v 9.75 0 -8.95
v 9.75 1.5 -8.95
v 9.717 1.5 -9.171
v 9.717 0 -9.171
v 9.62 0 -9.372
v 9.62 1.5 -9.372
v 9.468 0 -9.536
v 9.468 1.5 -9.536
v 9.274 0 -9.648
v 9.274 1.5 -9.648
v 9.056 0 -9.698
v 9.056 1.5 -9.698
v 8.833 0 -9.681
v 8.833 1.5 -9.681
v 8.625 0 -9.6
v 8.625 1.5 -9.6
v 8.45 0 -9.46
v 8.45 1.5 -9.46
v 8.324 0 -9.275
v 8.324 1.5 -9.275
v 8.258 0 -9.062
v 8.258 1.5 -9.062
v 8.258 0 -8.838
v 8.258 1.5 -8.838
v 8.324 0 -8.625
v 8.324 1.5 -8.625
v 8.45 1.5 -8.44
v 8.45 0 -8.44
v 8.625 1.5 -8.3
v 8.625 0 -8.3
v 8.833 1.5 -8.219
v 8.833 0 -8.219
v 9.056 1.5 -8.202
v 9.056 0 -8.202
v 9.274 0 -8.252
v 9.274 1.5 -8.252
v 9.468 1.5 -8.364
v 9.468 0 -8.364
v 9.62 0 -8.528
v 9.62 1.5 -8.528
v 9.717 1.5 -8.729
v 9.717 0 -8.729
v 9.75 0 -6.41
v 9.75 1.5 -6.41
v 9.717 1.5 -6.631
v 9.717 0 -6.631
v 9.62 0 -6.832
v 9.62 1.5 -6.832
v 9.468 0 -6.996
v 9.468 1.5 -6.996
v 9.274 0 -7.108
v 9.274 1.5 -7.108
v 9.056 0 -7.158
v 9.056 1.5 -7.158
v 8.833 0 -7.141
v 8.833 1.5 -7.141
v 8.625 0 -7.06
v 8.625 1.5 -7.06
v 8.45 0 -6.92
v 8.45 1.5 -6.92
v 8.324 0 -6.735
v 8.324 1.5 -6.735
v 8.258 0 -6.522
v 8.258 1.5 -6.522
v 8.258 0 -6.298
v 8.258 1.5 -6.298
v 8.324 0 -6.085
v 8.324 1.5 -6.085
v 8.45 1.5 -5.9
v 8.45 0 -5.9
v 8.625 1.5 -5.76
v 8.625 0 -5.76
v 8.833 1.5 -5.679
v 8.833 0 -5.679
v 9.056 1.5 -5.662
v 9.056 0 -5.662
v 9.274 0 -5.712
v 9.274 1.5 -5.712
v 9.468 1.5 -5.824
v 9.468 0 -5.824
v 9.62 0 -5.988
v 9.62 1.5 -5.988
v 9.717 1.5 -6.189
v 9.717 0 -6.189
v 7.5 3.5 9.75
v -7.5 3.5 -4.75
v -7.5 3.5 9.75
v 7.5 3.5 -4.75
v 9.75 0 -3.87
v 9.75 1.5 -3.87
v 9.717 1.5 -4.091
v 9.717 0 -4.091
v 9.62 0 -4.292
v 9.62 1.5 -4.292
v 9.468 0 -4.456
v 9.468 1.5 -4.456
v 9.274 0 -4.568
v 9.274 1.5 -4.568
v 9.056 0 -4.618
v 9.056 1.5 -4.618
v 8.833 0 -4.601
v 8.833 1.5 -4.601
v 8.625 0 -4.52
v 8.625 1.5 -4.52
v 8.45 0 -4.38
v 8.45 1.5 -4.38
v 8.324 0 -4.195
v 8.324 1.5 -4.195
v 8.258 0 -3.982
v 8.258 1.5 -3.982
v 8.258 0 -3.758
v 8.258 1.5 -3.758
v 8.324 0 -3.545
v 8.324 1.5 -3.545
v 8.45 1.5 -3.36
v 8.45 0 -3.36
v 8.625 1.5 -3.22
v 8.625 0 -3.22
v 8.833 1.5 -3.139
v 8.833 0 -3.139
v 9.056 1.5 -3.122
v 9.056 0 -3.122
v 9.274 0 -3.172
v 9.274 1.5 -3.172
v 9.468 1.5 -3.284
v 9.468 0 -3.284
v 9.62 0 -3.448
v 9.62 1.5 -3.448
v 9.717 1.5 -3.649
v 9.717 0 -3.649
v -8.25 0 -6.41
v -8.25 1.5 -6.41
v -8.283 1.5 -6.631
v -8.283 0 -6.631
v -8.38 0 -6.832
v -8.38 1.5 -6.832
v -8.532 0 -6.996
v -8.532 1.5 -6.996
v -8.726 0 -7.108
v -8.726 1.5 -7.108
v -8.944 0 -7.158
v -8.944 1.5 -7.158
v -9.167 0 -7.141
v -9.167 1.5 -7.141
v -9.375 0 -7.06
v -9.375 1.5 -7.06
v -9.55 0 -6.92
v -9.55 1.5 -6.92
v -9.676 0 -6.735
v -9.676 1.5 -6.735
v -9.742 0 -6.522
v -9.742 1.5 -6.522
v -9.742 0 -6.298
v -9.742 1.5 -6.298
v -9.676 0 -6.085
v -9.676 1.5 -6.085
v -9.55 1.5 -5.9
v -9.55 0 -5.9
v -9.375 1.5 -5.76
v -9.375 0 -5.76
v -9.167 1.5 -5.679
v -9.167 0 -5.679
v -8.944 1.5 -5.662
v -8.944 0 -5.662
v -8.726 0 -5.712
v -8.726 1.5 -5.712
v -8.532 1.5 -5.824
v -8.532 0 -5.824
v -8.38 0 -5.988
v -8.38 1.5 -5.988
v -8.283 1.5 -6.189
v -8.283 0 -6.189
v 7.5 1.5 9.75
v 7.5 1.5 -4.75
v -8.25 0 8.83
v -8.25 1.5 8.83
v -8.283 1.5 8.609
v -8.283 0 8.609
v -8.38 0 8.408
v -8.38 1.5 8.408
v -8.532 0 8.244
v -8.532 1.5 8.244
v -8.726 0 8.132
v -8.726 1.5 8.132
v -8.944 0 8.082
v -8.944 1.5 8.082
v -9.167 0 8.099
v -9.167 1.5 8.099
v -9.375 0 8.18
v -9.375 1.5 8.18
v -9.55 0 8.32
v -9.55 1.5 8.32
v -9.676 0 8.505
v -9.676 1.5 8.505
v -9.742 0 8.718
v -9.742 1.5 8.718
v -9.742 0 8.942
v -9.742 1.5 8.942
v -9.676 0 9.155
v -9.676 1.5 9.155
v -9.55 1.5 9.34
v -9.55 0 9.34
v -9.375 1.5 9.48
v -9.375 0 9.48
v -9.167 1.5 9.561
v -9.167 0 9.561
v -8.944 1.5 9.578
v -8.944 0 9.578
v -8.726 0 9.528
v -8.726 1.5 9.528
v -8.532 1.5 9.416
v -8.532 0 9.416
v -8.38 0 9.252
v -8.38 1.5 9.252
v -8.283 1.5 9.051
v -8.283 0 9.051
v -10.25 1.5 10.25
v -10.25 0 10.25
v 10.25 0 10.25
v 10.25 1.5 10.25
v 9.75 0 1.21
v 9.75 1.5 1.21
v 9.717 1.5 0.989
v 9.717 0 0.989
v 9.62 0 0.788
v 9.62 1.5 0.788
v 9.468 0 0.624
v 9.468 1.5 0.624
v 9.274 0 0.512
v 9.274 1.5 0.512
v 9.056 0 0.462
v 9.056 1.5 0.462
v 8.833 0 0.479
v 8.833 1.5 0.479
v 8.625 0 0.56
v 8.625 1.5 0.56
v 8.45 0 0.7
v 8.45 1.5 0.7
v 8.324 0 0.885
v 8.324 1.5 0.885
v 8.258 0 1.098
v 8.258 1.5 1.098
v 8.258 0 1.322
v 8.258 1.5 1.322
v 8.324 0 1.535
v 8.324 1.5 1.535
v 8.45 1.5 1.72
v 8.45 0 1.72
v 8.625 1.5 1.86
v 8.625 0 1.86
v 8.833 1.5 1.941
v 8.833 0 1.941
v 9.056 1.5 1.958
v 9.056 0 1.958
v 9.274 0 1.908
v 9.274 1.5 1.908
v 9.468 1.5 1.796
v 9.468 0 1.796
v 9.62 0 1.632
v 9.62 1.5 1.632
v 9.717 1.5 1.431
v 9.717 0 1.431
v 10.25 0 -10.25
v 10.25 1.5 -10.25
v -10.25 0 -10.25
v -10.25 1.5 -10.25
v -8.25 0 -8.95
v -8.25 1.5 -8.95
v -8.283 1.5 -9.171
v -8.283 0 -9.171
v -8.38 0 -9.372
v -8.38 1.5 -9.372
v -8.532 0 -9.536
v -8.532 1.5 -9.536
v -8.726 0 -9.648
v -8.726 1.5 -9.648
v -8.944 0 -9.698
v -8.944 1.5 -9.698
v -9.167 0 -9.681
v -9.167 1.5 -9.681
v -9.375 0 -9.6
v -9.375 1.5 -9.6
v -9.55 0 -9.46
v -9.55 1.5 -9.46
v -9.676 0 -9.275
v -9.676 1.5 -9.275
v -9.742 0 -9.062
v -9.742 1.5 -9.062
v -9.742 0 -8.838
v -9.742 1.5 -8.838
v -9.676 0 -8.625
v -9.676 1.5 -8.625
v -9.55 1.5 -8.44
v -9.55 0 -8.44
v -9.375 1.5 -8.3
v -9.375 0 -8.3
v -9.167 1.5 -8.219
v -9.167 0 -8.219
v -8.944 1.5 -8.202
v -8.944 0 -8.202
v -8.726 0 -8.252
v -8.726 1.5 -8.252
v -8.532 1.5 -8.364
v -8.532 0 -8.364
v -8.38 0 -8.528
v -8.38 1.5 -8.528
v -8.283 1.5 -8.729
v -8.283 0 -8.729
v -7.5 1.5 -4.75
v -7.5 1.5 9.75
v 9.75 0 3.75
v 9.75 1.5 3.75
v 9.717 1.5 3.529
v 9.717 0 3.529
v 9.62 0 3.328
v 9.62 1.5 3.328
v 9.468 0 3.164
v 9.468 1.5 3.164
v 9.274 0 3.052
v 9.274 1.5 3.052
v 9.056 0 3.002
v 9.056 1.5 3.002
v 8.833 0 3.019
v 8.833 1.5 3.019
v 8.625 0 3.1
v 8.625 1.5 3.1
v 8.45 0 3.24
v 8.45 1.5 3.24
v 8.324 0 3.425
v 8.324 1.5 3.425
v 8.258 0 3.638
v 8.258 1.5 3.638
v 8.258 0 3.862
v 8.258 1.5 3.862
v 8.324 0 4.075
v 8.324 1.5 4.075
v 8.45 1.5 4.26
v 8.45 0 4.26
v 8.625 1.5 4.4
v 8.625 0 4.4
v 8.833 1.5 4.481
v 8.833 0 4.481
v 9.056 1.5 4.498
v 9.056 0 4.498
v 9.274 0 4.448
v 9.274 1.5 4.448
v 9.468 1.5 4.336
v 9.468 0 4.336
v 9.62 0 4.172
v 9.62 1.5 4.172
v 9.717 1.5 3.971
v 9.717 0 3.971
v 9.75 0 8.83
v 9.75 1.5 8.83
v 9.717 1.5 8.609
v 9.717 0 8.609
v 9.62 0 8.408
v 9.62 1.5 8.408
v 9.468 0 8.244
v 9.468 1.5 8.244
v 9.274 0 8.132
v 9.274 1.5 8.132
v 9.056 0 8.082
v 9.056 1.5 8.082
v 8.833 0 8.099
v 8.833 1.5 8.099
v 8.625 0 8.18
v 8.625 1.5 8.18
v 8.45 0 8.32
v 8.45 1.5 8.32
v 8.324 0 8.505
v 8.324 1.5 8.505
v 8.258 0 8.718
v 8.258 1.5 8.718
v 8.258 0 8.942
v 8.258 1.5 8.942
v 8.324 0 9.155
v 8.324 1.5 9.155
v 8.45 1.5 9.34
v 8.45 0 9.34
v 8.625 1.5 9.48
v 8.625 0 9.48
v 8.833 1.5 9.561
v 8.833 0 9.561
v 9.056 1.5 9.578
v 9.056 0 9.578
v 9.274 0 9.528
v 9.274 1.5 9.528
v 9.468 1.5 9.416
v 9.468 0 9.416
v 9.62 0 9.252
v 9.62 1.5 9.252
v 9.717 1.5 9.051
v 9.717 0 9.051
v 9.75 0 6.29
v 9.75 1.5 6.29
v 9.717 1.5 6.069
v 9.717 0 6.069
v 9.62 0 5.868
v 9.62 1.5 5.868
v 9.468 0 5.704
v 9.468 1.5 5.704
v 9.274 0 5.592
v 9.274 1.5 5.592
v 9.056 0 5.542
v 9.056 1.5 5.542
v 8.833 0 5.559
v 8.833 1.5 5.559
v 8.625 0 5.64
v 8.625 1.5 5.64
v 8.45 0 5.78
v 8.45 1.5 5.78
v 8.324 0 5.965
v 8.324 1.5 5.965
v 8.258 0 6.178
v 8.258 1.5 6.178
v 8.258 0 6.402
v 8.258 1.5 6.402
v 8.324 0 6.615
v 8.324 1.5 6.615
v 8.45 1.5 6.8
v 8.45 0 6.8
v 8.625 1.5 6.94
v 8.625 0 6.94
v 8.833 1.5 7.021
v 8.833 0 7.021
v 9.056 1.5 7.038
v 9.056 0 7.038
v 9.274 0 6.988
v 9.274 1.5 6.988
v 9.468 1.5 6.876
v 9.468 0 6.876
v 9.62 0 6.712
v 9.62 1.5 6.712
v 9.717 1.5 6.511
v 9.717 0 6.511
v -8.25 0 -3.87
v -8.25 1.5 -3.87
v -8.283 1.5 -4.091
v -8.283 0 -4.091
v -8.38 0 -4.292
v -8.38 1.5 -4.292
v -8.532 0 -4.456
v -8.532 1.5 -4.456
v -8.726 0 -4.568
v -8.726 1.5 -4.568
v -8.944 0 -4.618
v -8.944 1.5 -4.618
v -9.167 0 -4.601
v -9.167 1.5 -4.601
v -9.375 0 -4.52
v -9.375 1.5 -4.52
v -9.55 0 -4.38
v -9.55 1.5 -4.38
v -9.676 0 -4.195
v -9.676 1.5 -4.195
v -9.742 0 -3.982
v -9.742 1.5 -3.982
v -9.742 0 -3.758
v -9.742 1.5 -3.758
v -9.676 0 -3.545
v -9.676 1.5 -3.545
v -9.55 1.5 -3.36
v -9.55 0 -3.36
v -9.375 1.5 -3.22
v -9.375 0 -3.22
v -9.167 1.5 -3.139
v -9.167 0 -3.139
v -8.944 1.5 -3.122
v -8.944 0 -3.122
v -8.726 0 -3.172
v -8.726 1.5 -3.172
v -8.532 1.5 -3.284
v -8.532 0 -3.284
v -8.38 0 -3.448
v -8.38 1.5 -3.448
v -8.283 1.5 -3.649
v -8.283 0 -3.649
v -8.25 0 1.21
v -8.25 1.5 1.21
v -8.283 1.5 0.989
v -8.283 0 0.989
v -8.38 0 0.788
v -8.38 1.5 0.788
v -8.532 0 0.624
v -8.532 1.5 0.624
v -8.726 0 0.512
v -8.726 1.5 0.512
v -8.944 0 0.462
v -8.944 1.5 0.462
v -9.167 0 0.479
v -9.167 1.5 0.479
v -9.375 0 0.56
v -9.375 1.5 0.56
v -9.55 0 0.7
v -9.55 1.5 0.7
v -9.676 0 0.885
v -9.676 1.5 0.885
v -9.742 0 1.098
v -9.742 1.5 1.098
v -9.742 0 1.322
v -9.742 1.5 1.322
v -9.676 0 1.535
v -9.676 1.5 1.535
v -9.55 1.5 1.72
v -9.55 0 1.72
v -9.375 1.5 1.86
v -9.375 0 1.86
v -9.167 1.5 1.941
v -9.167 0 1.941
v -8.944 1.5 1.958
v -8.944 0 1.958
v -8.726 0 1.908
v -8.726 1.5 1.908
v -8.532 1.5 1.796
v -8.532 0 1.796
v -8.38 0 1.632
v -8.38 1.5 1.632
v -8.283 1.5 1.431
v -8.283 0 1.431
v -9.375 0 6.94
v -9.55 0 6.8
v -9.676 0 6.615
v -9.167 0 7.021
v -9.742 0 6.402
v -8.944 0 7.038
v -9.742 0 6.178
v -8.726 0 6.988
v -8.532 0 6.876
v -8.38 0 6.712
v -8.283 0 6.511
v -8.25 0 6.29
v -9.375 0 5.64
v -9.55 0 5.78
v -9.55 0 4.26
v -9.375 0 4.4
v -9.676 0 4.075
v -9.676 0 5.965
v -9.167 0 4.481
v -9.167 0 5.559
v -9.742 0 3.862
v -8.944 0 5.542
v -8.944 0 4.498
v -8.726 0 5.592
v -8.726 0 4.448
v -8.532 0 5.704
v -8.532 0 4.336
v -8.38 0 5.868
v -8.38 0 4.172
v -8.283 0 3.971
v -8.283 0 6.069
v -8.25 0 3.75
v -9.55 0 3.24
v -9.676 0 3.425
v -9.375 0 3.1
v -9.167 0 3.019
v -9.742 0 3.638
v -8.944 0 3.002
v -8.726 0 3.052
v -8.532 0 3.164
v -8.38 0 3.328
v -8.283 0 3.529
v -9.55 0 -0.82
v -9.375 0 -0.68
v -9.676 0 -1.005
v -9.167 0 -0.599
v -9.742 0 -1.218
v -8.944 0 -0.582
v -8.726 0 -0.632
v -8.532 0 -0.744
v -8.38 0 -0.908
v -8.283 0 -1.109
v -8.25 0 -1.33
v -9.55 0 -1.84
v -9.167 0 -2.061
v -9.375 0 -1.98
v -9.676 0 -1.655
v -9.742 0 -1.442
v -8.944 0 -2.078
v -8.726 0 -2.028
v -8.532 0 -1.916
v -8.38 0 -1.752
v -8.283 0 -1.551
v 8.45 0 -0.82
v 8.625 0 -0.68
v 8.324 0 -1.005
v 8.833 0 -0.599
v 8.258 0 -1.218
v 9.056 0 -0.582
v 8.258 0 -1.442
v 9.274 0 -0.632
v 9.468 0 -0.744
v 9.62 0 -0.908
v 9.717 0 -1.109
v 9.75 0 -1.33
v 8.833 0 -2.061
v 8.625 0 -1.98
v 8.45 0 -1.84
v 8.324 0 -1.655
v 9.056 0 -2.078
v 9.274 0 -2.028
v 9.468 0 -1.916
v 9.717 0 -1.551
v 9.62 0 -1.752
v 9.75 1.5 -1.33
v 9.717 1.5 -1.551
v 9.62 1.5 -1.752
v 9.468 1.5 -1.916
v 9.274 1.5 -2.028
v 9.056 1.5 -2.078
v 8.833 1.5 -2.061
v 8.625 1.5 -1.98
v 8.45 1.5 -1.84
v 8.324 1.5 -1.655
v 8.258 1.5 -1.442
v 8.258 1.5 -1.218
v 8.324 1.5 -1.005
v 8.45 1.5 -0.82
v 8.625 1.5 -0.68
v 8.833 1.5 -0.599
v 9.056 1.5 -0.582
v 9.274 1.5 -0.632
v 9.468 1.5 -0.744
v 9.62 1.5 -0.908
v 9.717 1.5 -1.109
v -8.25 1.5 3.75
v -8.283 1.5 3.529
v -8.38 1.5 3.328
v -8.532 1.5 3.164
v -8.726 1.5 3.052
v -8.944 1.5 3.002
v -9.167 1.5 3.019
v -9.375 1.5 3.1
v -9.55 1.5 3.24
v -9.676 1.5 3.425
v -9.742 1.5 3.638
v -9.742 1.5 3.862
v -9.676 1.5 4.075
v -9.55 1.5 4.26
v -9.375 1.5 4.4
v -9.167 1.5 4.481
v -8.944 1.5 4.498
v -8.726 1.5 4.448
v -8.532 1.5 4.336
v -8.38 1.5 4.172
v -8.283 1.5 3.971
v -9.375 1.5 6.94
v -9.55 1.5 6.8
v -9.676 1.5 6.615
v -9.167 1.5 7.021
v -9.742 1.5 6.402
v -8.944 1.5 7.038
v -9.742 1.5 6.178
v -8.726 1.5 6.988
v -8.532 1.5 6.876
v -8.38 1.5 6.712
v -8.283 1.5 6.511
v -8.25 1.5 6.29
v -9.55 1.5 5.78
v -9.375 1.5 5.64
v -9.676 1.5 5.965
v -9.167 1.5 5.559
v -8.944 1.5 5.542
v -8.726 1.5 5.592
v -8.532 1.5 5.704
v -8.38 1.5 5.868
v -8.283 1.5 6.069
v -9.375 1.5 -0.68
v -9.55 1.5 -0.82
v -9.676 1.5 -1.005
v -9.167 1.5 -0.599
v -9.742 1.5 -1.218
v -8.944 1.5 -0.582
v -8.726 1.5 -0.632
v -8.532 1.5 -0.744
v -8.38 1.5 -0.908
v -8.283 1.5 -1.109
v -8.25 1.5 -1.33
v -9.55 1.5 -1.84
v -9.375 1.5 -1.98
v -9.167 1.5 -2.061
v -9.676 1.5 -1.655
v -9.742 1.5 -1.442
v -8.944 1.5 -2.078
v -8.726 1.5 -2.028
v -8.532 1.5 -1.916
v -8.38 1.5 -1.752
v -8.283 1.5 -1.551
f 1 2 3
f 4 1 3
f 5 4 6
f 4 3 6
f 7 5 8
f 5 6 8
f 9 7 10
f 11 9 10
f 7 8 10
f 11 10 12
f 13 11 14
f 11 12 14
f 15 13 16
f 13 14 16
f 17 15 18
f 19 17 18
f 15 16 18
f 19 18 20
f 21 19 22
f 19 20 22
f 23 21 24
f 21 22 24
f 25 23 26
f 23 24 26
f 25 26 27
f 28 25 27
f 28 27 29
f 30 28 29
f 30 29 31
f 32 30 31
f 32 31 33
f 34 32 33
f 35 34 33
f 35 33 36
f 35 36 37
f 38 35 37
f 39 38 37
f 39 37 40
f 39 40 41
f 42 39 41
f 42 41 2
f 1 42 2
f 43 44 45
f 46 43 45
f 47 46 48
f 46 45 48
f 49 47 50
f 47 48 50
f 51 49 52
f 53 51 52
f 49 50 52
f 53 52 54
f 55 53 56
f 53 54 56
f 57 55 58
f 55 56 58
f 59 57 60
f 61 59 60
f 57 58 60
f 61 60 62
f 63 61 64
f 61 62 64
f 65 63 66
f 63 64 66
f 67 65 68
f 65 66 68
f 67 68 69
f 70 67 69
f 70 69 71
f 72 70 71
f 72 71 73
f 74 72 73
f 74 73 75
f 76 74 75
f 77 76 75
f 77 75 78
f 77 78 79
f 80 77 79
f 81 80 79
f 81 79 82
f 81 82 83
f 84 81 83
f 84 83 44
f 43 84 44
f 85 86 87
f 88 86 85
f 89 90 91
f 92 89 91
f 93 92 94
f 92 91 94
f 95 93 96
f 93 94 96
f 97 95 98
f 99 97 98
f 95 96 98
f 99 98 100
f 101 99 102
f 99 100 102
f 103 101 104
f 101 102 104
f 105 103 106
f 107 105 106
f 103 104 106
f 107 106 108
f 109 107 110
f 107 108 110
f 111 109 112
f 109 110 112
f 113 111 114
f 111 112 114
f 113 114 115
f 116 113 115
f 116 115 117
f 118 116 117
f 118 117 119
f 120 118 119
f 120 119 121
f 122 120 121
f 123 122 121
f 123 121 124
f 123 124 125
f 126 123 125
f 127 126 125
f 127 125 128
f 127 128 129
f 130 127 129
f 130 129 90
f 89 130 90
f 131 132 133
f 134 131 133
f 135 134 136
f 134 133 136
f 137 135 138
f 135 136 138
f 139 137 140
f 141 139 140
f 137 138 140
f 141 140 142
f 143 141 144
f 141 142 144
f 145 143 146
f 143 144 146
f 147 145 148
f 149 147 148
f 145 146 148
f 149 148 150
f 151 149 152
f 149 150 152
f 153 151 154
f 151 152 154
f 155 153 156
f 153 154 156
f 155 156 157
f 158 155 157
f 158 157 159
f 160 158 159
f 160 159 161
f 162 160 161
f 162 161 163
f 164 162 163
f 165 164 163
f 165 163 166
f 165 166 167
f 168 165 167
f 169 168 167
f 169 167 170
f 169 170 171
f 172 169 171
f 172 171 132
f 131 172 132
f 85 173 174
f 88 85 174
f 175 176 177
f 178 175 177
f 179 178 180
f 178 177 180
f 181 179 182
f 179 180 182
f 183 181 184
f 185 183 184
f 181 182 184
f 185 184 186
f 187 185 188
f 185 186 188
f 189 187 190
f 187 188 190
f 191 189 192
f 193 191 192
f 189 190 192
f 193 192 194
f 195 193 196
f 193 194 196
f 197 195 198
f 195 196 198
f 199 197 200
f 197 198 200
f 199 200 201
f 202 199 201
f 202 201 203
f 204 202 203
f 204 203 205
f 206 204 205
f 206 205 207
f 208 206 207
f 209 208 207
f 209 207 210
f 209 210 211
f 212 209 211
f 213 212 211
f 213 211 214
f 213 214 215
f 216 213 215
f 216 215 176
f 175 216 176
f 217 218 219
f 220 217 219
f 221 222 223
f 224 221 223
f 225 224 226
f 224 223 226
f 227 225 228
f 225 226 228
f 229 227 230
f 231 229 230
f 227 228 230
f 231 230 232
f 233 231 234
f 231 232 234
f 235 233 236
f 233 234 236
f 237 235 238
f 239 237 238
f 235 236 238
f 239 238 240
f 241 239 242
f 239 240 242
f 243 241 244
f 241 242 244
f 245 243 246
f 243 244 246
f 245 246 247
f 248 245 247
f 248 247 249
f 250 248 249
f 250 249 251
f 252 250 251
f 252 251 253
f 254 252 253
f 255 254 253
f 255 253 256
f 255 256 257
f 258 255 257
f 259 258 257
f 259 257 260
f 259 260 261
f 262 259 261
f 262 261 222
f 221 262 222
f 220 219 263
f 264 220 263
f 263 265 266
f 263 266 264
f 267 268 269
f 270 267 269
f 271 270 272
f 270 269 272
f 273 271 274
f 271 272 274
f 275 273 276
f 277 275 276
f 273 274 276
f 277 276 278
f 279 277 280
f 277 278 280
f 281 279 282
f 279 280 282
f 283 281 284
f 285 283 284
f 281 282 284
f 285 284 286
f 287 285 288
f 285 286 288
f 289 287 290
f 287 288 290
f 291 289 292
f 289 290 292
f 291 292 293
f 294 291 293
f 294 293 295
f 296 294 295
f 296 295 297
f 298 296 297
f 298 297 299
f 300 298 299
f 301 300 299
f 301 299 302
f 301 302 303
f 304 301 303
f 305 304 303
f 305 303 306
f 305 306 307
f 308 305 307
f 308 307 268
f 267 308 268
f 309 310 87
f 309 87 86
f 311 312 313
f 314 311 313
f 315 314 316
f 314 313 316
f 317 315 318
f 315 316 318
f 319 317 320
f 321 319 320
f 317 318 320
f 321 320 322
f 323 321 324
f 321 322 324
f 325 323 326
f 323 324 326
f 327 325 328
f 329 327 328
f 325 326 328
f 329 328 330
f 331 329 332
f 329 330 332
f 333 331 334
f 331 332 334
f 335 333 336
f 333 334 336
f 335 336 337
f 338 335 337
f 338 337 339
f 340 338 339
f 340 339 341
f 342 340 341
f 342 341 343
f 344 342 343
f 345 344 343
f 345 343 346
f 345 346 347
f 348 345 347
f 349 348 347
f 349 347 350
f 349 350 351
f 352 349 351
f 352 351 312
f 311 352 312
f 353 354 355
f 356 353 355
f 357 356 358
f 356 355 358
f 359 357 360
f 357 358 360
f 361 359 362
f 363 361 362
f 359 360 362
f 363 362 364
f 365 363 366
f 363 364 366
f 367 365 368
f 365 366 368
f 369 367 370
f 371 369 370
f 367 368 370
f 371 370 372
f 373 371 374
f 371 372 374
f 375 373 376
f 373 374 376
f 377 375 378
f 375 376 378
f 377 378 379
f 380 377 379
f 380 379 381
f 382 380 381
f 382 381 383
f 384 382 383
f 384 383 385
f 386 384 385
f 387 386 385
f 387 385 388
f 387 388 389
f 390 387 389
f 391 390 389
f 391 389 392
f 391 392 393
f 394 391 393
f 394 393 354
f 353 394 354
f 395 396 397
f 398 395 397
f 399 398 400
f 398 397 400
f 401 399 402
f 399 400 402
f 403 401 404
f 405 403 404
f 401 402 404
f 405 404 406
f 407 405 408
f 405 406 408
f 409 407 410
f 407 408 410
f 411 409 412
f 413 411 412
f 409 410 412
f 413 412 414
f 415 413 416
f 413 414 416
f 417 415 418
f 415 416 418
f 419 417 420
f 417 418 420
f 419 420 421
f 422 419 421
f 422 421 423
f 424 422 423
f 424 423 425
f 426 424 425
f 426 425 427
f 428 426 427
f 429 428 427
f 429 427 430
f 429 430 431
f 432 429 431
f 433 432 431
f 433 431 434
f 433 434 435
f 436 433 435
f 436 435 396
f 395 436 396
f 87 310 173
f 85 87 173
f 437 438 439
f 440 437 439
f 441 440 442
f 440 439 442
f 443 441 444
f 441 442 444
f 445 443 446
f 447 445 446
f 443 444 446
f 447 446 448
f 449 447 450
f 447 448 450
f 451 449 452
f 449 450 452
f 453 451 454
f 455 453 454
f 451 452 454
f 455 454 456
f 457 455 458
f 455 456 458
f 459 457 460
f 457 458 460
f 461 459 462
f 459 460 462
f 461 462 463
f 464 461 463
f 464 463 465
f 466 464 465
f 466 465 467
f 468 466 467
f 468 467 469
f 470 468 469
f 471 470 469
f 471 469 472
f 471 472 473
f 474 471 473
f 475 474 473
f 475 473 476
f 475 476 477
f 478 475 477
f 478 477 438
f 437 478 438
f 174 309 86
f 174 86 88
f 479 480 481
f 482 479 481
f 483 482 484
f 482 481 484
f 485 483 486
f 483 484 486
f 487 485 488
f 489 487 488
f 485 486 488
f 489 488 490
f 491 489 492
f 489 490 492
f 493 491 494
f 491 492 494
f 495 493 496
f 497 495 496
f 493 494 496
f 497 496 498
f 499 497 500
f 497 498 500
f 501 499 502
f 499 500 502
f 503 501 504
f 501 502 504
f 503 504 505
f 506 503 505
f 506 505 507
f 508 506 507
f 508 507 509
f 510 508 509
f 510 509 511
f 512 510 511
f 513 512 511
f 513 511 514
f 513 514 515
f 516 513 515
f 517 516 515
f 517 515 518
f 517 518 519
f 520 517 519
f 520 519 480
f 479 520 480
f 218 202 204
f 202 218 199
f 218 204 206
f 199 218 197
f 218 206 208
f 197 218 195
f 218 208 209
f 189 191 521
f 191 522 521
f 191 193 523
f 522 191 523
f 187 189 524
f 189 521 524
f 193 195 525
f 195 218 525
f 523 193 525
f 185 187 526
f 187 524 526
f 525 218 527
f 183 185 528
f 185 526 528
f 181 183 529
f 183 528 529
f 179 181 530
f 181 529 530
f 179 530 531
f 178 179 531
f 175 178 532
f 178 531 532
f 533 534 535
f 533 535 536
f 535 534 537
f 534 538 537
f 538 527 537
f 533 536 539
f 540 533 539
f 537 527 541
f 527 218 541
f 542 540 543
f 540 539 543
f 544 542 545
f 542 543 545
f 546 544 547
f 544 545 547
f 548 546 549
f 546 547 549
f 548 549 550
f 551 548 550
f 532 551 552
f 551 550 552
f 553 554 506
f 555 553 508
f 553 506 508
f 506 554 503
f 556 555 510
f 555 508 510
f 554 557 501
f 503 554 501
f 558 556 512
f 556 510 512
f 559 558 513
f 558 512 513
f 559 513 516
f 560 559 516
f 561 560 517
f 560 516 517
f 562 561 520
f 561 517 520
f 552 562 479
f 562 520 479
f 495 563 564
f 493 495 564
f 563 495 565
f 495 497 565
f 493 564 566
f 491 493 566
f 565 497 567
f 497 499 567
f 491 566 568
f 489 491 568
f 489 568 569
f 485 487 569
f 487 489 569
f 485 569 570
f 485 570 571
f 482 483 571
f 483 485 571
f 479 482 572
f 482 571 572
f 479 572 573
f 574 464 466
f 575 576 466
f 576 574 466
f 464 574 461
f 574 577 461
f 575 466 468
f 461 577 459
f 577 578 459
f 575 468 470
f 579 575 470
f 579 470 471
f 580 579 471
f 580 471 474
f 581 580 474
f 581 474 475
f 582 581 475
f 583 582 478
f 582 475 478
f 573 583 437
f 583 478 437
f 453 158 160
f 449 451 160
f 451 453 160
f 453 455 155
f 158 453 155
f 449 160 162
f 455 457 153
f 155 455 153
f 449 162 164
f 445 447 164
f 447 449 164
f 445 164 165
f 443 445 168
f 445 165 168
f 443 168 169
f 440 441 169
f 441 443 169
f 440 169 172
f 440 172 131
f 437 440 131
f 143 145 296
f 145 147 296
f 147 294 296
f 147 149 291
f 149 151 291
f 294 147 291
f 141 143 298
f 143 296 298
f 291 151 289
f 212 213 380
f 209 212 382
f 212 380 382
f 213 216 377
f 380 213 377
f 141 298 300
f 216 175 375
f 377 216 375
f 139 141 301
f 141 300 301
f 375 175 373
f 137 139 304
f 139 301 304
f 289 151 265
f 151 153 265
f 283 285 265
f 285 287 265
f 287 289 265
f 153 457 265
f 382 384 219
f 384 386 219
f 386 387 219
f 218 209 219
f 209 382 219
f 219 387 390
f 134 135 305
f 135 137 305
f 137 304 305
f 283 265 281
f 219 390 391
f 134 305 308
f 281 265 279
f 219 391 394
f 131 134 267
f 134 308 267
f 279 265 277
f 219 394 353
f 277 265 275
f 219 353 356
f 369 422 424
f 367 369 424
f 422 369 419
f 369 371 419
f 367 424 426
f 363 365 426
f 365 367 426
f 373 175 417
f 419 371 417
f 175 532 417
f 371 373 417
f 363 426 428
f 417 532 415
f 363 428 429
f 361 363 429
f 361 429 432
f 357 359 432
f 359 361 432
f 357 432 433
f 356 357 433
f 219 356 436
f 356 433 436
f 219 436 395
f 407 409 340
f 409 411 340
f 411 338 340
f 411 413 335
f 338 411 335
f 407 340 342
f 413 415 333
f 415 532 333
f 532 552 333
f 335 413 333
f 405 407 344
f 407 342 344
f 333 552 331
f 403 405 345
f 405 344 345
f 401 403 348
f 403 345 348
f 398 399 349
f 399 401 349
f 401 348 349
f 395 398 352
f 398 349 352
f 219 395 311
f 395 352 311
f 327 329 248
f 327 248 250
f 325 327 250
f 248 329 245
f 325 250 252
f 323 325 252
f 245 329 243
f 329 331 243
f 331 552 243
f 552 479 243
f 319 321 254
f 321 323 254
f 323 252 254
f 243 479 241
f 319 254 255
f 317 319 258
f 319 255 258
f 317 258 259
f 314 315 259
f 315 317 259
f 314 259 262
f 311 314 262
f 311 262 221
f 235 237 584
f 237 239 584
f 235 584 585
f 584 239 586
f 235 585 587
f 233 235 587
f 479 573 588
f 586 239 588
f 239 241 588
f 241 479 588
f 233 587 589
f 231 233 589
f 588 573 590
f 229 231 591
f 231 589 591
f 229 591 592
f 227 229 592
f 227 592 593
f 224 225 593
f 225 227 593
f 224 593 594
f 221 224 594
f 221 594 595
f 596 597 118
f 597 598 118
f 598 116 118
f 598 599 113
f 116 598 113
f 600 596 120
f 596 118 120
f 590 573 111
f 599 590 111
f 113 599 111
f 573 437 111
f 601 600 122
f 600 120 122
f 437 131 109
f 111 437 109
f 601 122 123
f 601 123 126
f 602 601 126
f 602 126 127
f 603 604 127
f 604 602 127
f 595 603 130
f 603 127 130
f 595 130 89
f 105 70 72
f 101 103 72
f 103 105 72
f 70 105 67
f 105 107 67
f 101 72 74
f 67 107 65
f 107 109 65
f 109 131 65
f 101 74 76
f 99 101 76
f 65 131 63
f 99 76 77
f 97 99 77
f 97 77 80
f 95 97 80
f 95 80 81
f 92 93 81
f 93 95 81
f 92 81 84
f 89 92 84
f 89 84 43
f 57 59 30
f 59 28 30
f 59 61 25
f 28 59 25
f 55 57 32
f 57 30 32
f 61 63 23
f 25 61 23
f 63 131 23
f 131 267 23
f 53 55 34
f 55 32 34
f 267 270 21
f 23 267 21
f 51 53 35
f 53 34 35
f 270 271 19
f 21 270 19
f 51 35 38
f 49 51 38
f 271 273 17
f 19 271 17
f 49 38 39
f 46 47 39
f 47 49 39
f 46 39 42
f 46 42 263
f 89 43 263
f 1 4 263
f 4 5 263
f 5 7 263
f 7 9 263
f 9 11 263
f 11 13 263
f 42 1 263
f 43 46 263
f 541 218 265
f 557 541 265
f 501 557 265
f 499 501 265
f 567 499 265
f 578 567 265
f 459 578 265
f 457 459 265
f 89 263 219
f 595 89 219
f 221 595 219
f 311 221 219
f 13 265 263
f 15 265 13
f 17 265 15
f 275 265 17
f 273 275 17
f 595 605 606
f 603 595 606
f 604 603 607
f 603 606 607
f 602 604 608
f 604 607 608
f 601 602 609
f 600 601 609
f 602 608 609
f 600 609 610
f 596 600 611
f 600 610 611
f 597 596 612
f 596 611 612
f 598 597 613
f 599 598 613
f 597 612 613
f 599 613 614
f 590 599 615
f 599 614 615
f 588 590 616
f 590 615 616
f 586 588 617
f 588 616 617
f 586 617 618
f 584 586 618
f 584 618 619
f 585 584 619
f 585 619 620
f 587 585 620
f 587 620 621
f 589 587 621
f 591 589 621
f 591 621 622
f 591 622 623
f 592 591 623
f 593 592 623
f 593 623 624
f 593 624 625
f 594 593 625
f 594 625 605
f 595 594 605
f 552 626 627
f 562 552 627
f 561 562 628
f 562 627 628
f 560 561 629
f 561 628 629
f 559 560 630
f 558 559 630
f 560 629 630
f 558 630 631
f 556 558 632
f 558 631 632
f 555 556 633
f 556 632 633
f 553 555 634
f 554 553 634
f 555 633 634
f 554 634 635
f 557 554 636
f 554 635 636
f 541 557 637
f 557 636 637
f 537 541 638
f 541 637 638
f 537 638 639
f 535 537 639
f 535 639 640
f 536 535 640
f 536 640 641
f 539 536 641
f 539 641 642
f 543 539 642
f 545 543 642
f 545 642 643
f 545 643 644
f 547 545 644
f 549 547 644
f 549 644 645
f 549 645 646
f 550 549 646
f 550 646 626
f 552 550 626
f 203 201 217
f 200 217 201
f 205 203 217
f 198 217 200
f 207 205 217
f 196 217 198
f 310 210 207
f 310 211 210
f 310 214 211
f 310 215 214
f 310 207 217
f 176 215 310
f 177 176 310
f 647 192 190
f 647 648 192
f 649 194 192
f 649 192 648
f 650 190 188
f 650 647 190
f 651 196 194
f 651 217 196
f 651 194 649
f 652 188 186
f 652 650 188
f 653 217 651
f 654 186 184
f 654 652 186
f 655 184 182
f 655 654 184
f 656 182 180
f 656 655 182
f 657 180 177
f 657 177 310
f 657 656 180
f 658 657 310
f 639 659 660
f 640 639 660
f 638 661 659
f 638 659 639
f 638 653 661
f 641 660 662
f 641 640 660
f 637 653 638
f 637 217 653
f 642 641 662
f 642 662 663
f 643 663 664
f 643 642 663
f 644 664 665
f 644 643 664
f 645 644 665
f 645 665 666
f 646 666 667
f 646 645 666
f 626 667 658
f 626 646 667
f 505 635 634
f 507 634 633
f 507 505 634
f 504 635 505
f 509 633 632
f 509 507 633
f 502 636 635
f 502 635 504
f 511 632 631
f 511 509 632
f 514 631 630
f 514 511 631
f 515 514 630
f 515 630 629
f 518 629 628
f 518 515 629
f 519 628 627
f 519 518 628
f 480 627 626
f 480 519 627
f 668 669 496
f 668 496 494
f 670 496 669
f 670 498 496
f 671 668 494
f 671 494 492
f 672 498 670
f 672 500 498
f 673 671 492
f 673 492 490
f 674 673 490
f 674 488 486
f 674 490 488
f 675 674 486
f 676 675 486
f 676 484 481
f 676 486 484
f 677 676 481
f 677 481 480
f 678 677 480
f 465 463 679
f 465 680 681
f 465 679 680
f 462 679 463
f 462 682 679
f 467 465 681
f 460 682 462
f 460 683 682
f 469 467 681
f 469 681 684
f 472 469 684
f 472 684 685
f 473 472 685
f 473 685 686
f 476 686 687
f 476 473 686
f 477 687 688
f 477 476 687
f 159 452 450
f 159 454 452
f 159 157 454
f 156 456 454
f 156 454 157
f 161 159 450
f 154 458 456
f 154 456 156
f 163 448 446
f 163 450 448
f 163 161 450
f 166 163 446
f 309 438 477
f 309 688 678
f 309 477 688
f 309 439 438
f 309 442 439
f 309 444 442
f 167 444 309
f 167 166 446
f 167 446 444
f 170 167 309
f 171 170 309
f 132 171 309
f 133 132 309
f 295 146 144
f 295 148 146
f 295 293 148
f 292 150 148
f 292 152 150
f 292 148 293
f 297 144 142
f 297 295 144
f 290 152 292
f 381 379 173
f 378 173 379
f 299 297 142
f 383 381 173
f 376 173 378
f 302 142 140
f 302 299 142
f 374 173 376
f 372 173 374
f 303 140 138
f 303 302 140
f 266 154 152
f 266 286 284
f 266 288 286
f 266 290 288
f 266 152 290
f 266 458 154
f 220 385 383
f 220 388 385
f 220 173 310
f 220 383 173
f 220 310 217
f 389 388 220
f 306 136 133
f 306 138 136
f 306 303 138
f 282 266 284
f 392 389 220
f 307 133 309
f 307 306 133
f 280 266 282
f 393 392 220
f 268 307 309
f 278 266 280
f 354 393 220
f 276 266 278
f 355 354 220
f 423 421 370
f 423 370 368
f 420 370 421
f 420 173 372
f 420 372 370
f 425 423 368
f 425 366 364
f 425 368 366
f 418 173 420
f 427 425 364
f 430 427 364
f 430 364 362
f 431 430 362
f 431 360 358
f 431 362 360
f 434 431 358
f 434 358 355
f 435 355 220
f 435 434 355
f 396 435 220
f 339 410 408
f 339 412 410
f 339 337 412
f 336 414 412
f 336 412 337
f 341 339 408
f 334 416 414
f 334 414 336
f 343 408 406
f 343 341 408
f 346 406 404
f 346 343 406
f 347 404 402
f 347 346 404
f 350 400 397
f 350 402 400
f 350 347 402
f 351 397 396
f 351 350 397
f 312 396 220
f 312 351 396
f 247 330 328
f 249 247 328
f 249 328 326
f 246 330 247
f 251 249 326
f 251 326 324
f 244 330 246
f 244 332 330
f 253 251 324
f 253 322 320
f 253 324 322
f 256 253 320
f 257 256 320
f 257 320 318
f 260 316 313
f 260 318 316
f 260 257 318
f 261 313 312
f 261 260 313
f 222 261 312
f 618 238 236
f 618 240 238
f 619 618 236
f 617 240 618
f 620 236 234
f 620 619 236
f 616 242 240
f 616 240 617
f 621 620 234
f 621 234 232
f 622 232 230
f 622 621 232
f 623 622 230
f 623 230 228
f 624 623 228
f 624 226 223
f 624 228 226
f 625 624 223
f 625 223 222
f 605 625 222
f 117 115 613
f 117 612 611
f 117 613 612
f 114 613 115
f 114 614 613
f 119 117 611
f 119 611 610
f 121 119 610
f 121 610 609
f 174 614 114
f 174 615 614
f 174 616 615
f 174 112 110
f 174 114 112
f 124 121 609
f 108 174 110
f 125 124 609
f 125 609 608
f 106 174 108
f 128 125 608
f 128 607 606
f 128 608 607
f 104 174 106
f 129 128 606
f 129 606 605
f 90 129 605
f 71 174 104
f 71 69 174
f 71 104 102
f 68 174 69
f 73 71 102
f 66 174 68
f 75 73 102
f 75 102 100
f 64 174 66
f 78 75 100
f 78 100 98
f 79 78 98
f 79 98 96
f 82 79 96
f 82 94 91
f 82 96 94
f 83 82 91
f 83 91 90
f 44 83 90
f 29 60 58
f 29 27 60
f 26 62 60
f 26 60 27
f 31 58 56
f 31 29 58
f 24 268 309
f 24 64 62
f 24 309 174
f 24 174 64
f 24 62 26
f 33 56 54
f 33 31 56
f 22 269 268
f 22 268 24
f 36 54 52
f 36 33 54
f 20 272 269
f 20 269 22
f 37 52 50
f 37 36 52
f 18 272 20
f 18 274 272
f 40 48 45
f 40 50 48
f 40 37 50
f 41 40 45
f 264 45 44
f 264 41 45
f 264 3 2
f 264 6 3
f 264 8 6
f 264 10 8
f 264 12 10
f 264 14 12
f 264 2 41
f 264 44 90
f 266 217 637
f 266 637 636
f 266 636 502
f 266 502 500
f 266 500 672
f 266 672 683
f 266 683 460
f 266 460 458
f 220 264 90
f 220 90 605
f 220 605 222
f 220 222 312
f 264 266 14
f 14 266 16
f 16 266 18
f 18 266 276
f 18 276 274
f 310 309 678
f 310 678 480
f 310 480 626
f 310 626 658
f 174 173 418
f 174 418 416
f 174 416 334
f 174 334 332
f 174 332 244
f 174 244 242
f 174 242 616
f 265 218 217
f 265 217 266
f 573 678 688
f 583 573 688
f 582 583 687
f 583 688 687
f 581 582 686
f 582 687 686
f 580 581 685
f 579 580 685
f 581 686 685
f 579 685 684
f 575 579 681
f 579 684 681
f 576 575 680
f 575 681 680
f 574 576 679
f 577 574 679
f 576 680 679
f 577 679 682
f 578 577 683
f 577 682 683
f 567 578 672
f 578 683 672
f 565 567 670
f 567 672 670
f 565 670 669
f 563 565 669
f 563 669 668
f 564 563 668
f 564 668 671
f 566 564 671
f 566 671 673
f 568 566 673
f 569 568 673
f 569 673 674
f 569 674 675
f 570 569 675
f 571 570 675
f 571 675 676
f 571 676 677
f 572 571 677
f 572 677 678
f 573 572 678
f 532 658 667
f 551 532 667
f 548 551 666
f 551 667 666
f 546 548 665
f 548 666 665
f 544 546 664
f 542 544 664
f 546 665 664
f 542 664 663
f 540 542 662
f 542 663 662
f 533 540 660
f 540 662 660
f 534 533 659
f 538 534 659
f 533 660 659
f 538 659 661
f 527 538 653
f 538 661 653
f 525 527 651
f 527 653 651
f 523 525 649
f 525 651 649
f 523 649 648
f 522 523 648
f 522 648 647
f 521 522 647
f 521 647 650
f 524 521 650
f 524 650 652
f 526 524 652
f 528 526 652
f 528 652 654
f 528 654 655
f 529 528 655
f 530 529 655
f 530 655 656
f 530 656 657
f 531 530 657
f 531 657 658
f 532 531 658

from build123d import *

# Parameters (mm, degrees)
SKETCH1_W           = 20.5
SKETCH1_H           = 20.5
BOSS_EXTRUDE1_DEPTH = 1.5
CUT_EXTRUDE1_START  = 1.5
SKETCH2_R           = 0.75
CUT_EXTRUDE1_DEPTH  = 2.5
BOSS_EXTRUDE2_START = 1.5
SKETCH3_W           = 15
SKETCH3_H           = 14.5
BOSS_EXTRUDE2_DEPTH = 2


with BuildPart() as part:
    # Sketch1 → Boss-Extrude1 (new body)
    with BuildSketch(Plane(origin=(0, 0, 0), x_dir=(1, 0, 0), z_dir=(0, 1, 0))):
        Rectangle(SKETCH1_W, SKETCH1_H)
    extrude(amount=BOSS_EXTRUDE1_DEPTH)

    # Sketch2 → Cut-Extrude1 (cut, through all)
    with BuildSketch(Plane(origin=(0, 0, 0), x_dir=(1, 0, 0), z_dir=(0, 1, 0)).offset(CUT_EXTRUDE1_START)):
        with Locations((-9, 8.95)):
            Circle(SKETCH2_R)
        with Locations((-9, 6.41)):
            Circle(SKETCH2_R)
        with Locations((-9, 3.87)):
            Circle(SKETCH2_R)
        with Locations((-9, 1.33)):
            Circle(SKETCH2_R)
        with Locations((-9, -1.21)):
            Circle(SKETCH2_R)
        with Locations((-9, -3.75)):
            Circle(SKETCH2_R)
        with Locations((-9, -6.29)):
            Circle(SKETCH2_R)
        with Locations((-9, -8.83)):
            Circle(SKETCH2_R)
        with Locations((9, -8.83)):
            Circle(SKETCH2_R)
        with Locations((9, -6.29)):
            Circle(SKETCH2_R)
        with Locations((9, -3.75)):
            Circle(SKETCH2_R)
        with Locations((9, -1.21)):
            Circle(SKETCH2_R)
        with Locations((9, 1.33)):
            Circle(SKETCH2_R)
        with Locations((9, 3.87)):
            Circle(SKETCH2_R)
        with Locations((9, 6.41)):
            Circle(SKETCH2_R)
        with Locations((9, 8.95)):
            Circle(SKETCH2_R)
    extrude(amount=-CUT_EXTRUDE1_DEPTH, mode=Mode.SUBTRACT)

    # Sketch3 → Boss-Extrude2 (add)
    with BuildSketch(Plane(origin=(0, 0, 0), x_dir=(1, 0, 0), z_dir=(0, 1, 0)).offset(BOSS_EXTRUDE2_START)):
        with Locations((0, -2.5)):
            Rectangle(SKETCH3_W, SKETCH3_H)
    extrude(amount=BOSS_EXTRUDE2_DEPTH)


solid = part.part
